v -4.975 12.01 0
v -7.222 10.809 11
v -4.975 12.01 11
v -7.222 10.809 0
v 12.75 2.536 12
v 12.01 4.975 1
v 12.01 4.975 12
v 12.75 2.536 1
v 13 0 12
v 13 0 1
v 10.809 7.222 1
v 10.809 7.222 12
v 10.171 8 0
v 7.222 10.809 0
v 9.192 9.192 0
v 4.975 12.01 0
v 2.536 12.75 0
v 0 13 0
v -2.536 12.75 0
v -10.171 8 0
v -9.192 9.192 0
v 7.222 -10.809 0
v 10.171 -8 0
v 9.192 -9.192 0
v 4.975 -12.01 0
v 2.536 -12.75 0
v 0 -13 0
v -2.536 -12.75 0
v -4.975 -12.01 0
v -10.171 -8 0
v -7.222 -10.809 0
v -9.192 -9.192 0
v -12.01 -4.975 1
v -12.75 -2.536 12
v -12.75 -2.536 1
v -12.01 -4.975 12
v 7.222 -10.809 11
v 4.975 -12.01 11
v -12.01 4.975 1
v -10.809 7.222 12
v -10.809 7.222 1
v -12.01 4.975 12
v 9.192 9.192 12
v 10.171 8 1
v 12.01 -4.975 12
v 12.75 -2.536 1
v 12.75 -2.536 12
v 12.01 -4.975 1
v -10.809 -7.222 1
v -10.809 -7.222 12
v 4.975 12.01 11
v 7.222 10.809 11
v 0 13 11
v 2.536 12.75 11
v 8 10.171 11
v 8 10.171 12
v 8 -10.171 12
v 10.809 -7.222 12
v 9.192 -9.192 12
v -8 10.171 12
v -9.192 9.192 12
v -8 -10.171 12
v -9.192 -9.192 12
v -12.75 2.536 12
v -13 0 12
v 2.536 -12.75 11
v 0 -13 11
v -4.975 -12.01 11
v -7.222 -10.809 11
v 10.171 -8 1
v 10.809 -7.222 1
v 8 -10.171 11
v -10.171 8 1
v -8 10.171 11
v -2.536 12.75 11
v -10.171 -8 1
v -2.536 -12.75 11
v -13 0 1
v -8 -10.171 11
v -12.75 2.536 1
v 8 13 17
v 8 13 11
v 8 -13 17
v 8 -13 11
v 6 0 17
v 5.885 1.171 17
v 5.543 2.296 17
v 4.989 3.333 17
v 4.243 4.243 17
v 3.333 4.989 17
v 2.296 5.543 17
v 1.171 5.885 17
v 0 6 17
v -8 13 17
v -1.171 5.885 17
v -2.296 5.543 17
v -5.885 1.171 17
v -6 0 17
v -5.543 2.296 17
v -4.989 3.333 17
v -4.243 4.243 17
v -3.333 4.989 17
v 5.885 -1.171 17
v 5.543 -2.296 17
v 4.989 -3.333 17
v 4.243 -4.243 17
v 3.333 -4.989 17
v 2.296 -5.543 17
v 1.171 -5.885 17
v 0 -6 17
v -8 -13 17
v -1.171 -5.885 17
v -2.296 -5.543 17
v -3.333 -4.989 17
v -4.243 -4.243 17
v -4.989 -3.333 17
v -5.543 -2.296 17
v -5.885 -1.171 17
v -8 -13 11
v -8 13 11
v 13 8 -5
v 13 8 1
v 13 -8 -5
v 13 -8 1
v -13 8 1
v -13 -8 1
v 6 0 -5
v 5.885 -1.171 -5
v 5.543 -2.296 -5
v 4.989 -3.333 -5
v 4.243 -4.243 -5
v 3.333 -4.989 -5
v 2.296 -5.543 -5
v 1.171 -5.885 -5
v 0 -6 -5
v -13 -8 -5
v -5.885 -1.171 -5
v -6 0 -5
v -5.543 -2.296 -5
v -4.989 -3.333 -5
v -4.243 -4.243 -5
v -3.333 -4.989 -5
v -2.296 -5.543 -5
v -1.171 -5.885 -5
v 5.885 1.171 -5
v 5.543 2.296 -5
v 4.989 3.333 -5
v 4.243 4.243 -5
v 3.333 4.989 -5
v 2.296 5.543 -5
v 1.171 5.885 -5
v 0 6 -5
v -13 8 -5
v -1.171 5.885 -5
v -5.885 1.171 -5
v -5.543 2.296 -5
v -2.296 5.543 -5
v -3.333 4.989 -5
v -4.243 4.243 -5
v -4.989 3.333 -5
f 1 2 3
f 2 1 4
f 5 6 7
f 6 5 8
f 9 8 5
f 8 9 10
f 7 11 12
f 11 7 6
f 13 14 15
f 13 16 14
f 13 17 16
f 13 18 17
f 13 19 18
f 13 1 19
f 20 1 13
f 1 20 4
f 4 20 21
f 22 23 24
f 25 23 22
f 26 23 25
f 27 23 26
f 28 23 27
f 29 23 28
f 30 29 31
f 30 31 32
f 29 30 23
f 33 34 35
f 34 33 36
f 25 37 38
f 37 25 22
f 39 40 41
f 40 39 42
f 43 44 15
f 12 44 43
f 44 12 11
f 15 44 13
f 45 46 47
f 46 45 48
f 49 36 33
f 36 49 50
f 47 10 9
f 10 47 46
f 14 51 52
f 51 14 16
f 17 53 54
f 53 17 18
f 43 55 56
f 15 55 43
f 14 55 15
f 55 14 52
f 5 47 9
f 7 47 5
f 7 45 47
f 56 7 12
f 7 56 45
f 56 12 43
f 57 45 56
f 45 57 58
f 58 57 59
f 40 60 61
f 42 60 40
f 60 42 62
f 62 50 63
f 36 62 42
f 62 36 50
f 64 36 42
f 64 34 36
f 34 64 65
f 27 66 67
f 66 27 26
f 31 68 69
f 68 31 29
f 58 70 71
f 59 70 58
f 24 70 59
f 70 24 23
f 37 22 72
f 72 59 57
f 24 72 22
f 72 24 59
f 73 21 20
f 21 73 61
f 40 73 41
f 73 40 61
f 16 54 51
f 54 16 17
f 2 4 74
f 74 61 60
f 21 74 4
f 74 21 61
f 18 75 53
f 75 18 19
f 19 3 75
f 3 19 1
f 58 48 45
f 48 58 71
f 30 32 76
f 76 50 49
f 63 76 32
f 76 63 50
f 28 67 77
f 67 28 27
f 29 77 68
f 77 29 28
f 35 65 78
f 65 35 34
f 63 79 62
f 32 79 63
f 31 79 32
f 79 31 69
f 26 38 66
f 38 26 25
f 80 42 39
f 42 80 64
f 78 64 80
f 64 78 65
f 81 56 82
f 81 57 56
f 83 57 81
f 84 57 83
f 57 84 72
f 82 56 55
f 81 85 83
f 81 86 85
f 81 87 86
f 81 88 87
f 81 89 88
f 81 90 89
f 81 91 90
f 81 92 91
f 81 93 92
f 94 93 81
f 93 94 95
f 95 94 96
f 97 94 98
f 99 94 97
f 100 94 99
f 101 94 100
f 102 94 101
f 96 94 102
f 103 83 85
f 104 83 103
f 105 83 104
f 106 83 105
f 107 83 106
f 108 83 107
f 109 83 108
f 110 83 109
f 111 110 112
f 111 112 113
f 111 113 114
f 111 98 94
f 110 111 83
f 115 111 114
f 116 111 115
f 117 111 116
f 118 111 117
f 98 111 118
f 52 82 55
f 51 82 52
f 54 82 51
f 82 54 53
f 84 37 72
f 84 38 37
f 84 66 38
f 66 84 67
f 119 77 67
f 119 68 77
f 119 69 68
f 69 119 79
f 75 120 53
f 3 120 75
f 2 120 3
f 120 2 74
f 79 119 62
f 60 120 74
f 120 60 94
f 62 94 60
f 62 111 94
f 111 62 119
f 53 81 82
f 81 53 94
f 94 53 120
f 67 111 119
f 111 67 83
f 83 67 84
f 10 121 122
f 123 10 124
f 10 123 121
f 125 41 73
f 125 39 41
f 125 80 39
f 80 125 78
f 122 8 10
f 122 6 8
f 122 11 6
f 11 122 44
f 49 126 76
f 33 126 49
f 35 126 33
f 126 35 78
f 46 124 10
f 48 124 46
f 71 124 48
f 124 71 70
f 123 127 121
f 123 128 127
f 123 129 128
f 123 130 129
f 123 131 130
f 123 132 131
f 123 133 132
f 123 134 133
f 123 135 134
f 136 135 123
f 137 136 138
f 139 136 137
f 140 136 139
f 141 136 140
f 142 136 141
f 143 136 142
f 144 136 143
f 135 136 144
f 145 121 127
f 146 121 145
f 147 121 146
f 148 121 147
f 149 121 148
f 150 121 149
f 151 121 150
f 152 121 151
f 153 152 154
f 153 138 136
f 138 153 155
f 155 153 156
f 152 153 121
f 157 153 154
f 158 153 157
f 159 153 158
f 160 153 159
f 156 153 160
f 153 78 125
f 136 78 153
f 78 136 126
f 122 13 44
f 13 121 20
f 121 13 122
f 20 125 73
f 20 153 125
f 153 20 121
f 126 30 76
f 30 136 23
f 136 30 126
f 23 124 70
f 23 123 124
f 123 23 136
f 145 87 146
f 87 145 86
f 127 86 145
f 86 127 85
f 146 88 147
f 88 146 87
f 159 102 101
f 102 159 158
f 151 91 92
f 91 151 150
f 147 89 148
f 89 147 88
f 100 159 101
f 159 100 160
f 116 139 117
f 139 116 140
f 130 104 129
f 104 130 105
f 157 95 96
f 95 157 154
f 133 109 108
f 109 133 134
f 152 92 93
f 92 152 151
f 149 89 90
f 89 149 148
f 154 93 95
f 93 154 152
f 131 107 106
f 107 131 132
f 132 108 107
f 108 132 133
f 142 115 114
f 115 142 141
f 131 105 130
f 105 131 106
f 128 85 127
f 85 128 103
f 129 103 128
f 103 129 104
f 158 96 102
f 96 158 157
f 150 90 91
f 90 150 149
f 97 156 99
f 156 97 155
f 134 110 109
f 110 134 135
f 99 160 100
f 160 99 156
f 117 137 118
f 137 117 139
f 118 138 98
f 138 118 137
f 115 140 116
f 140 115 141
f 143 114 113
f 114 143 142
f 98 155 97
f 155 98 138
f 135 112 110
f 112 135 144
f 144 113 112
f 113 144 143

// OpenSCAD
$fn = 32;

// ----------------------------------------------------------------------
// Oldham coupling disc: 26 x 22 mm
// ----------------------------------------------------------------------

// --- parameters (mm) ---
disc_d = 26;              // disc diameter
disc_t = 12;              // disc thickness
tongue_w = 16;            // tongue width
tongue_h = 5;             // tongue height
bore_d = 12;              // centre lightening bore

module disc() {
  cylinder(h = disc_t, d = disc_d);
  /* tongue on the top face, sunk 1 mm into the disc */
  translate([-tongue_w / 2, -disc_d / 2, disc_t - 1]) cube([tongue_w, disc_d, tongue_h + 1]);
  /* slot wall on the bottom face, 90 degrees turned */
  translate([-disc_d / 2, -tongue_w / 2, -tongue_h]) cube([disc_d, tongue_w, tongue_h + 1]);
}

difference() {
  disc();
  translate([0, 0, -tongue_h - 1]) cylinder(h = disc_t + 2 * tongue_h + 2, d = bore_d);
}
